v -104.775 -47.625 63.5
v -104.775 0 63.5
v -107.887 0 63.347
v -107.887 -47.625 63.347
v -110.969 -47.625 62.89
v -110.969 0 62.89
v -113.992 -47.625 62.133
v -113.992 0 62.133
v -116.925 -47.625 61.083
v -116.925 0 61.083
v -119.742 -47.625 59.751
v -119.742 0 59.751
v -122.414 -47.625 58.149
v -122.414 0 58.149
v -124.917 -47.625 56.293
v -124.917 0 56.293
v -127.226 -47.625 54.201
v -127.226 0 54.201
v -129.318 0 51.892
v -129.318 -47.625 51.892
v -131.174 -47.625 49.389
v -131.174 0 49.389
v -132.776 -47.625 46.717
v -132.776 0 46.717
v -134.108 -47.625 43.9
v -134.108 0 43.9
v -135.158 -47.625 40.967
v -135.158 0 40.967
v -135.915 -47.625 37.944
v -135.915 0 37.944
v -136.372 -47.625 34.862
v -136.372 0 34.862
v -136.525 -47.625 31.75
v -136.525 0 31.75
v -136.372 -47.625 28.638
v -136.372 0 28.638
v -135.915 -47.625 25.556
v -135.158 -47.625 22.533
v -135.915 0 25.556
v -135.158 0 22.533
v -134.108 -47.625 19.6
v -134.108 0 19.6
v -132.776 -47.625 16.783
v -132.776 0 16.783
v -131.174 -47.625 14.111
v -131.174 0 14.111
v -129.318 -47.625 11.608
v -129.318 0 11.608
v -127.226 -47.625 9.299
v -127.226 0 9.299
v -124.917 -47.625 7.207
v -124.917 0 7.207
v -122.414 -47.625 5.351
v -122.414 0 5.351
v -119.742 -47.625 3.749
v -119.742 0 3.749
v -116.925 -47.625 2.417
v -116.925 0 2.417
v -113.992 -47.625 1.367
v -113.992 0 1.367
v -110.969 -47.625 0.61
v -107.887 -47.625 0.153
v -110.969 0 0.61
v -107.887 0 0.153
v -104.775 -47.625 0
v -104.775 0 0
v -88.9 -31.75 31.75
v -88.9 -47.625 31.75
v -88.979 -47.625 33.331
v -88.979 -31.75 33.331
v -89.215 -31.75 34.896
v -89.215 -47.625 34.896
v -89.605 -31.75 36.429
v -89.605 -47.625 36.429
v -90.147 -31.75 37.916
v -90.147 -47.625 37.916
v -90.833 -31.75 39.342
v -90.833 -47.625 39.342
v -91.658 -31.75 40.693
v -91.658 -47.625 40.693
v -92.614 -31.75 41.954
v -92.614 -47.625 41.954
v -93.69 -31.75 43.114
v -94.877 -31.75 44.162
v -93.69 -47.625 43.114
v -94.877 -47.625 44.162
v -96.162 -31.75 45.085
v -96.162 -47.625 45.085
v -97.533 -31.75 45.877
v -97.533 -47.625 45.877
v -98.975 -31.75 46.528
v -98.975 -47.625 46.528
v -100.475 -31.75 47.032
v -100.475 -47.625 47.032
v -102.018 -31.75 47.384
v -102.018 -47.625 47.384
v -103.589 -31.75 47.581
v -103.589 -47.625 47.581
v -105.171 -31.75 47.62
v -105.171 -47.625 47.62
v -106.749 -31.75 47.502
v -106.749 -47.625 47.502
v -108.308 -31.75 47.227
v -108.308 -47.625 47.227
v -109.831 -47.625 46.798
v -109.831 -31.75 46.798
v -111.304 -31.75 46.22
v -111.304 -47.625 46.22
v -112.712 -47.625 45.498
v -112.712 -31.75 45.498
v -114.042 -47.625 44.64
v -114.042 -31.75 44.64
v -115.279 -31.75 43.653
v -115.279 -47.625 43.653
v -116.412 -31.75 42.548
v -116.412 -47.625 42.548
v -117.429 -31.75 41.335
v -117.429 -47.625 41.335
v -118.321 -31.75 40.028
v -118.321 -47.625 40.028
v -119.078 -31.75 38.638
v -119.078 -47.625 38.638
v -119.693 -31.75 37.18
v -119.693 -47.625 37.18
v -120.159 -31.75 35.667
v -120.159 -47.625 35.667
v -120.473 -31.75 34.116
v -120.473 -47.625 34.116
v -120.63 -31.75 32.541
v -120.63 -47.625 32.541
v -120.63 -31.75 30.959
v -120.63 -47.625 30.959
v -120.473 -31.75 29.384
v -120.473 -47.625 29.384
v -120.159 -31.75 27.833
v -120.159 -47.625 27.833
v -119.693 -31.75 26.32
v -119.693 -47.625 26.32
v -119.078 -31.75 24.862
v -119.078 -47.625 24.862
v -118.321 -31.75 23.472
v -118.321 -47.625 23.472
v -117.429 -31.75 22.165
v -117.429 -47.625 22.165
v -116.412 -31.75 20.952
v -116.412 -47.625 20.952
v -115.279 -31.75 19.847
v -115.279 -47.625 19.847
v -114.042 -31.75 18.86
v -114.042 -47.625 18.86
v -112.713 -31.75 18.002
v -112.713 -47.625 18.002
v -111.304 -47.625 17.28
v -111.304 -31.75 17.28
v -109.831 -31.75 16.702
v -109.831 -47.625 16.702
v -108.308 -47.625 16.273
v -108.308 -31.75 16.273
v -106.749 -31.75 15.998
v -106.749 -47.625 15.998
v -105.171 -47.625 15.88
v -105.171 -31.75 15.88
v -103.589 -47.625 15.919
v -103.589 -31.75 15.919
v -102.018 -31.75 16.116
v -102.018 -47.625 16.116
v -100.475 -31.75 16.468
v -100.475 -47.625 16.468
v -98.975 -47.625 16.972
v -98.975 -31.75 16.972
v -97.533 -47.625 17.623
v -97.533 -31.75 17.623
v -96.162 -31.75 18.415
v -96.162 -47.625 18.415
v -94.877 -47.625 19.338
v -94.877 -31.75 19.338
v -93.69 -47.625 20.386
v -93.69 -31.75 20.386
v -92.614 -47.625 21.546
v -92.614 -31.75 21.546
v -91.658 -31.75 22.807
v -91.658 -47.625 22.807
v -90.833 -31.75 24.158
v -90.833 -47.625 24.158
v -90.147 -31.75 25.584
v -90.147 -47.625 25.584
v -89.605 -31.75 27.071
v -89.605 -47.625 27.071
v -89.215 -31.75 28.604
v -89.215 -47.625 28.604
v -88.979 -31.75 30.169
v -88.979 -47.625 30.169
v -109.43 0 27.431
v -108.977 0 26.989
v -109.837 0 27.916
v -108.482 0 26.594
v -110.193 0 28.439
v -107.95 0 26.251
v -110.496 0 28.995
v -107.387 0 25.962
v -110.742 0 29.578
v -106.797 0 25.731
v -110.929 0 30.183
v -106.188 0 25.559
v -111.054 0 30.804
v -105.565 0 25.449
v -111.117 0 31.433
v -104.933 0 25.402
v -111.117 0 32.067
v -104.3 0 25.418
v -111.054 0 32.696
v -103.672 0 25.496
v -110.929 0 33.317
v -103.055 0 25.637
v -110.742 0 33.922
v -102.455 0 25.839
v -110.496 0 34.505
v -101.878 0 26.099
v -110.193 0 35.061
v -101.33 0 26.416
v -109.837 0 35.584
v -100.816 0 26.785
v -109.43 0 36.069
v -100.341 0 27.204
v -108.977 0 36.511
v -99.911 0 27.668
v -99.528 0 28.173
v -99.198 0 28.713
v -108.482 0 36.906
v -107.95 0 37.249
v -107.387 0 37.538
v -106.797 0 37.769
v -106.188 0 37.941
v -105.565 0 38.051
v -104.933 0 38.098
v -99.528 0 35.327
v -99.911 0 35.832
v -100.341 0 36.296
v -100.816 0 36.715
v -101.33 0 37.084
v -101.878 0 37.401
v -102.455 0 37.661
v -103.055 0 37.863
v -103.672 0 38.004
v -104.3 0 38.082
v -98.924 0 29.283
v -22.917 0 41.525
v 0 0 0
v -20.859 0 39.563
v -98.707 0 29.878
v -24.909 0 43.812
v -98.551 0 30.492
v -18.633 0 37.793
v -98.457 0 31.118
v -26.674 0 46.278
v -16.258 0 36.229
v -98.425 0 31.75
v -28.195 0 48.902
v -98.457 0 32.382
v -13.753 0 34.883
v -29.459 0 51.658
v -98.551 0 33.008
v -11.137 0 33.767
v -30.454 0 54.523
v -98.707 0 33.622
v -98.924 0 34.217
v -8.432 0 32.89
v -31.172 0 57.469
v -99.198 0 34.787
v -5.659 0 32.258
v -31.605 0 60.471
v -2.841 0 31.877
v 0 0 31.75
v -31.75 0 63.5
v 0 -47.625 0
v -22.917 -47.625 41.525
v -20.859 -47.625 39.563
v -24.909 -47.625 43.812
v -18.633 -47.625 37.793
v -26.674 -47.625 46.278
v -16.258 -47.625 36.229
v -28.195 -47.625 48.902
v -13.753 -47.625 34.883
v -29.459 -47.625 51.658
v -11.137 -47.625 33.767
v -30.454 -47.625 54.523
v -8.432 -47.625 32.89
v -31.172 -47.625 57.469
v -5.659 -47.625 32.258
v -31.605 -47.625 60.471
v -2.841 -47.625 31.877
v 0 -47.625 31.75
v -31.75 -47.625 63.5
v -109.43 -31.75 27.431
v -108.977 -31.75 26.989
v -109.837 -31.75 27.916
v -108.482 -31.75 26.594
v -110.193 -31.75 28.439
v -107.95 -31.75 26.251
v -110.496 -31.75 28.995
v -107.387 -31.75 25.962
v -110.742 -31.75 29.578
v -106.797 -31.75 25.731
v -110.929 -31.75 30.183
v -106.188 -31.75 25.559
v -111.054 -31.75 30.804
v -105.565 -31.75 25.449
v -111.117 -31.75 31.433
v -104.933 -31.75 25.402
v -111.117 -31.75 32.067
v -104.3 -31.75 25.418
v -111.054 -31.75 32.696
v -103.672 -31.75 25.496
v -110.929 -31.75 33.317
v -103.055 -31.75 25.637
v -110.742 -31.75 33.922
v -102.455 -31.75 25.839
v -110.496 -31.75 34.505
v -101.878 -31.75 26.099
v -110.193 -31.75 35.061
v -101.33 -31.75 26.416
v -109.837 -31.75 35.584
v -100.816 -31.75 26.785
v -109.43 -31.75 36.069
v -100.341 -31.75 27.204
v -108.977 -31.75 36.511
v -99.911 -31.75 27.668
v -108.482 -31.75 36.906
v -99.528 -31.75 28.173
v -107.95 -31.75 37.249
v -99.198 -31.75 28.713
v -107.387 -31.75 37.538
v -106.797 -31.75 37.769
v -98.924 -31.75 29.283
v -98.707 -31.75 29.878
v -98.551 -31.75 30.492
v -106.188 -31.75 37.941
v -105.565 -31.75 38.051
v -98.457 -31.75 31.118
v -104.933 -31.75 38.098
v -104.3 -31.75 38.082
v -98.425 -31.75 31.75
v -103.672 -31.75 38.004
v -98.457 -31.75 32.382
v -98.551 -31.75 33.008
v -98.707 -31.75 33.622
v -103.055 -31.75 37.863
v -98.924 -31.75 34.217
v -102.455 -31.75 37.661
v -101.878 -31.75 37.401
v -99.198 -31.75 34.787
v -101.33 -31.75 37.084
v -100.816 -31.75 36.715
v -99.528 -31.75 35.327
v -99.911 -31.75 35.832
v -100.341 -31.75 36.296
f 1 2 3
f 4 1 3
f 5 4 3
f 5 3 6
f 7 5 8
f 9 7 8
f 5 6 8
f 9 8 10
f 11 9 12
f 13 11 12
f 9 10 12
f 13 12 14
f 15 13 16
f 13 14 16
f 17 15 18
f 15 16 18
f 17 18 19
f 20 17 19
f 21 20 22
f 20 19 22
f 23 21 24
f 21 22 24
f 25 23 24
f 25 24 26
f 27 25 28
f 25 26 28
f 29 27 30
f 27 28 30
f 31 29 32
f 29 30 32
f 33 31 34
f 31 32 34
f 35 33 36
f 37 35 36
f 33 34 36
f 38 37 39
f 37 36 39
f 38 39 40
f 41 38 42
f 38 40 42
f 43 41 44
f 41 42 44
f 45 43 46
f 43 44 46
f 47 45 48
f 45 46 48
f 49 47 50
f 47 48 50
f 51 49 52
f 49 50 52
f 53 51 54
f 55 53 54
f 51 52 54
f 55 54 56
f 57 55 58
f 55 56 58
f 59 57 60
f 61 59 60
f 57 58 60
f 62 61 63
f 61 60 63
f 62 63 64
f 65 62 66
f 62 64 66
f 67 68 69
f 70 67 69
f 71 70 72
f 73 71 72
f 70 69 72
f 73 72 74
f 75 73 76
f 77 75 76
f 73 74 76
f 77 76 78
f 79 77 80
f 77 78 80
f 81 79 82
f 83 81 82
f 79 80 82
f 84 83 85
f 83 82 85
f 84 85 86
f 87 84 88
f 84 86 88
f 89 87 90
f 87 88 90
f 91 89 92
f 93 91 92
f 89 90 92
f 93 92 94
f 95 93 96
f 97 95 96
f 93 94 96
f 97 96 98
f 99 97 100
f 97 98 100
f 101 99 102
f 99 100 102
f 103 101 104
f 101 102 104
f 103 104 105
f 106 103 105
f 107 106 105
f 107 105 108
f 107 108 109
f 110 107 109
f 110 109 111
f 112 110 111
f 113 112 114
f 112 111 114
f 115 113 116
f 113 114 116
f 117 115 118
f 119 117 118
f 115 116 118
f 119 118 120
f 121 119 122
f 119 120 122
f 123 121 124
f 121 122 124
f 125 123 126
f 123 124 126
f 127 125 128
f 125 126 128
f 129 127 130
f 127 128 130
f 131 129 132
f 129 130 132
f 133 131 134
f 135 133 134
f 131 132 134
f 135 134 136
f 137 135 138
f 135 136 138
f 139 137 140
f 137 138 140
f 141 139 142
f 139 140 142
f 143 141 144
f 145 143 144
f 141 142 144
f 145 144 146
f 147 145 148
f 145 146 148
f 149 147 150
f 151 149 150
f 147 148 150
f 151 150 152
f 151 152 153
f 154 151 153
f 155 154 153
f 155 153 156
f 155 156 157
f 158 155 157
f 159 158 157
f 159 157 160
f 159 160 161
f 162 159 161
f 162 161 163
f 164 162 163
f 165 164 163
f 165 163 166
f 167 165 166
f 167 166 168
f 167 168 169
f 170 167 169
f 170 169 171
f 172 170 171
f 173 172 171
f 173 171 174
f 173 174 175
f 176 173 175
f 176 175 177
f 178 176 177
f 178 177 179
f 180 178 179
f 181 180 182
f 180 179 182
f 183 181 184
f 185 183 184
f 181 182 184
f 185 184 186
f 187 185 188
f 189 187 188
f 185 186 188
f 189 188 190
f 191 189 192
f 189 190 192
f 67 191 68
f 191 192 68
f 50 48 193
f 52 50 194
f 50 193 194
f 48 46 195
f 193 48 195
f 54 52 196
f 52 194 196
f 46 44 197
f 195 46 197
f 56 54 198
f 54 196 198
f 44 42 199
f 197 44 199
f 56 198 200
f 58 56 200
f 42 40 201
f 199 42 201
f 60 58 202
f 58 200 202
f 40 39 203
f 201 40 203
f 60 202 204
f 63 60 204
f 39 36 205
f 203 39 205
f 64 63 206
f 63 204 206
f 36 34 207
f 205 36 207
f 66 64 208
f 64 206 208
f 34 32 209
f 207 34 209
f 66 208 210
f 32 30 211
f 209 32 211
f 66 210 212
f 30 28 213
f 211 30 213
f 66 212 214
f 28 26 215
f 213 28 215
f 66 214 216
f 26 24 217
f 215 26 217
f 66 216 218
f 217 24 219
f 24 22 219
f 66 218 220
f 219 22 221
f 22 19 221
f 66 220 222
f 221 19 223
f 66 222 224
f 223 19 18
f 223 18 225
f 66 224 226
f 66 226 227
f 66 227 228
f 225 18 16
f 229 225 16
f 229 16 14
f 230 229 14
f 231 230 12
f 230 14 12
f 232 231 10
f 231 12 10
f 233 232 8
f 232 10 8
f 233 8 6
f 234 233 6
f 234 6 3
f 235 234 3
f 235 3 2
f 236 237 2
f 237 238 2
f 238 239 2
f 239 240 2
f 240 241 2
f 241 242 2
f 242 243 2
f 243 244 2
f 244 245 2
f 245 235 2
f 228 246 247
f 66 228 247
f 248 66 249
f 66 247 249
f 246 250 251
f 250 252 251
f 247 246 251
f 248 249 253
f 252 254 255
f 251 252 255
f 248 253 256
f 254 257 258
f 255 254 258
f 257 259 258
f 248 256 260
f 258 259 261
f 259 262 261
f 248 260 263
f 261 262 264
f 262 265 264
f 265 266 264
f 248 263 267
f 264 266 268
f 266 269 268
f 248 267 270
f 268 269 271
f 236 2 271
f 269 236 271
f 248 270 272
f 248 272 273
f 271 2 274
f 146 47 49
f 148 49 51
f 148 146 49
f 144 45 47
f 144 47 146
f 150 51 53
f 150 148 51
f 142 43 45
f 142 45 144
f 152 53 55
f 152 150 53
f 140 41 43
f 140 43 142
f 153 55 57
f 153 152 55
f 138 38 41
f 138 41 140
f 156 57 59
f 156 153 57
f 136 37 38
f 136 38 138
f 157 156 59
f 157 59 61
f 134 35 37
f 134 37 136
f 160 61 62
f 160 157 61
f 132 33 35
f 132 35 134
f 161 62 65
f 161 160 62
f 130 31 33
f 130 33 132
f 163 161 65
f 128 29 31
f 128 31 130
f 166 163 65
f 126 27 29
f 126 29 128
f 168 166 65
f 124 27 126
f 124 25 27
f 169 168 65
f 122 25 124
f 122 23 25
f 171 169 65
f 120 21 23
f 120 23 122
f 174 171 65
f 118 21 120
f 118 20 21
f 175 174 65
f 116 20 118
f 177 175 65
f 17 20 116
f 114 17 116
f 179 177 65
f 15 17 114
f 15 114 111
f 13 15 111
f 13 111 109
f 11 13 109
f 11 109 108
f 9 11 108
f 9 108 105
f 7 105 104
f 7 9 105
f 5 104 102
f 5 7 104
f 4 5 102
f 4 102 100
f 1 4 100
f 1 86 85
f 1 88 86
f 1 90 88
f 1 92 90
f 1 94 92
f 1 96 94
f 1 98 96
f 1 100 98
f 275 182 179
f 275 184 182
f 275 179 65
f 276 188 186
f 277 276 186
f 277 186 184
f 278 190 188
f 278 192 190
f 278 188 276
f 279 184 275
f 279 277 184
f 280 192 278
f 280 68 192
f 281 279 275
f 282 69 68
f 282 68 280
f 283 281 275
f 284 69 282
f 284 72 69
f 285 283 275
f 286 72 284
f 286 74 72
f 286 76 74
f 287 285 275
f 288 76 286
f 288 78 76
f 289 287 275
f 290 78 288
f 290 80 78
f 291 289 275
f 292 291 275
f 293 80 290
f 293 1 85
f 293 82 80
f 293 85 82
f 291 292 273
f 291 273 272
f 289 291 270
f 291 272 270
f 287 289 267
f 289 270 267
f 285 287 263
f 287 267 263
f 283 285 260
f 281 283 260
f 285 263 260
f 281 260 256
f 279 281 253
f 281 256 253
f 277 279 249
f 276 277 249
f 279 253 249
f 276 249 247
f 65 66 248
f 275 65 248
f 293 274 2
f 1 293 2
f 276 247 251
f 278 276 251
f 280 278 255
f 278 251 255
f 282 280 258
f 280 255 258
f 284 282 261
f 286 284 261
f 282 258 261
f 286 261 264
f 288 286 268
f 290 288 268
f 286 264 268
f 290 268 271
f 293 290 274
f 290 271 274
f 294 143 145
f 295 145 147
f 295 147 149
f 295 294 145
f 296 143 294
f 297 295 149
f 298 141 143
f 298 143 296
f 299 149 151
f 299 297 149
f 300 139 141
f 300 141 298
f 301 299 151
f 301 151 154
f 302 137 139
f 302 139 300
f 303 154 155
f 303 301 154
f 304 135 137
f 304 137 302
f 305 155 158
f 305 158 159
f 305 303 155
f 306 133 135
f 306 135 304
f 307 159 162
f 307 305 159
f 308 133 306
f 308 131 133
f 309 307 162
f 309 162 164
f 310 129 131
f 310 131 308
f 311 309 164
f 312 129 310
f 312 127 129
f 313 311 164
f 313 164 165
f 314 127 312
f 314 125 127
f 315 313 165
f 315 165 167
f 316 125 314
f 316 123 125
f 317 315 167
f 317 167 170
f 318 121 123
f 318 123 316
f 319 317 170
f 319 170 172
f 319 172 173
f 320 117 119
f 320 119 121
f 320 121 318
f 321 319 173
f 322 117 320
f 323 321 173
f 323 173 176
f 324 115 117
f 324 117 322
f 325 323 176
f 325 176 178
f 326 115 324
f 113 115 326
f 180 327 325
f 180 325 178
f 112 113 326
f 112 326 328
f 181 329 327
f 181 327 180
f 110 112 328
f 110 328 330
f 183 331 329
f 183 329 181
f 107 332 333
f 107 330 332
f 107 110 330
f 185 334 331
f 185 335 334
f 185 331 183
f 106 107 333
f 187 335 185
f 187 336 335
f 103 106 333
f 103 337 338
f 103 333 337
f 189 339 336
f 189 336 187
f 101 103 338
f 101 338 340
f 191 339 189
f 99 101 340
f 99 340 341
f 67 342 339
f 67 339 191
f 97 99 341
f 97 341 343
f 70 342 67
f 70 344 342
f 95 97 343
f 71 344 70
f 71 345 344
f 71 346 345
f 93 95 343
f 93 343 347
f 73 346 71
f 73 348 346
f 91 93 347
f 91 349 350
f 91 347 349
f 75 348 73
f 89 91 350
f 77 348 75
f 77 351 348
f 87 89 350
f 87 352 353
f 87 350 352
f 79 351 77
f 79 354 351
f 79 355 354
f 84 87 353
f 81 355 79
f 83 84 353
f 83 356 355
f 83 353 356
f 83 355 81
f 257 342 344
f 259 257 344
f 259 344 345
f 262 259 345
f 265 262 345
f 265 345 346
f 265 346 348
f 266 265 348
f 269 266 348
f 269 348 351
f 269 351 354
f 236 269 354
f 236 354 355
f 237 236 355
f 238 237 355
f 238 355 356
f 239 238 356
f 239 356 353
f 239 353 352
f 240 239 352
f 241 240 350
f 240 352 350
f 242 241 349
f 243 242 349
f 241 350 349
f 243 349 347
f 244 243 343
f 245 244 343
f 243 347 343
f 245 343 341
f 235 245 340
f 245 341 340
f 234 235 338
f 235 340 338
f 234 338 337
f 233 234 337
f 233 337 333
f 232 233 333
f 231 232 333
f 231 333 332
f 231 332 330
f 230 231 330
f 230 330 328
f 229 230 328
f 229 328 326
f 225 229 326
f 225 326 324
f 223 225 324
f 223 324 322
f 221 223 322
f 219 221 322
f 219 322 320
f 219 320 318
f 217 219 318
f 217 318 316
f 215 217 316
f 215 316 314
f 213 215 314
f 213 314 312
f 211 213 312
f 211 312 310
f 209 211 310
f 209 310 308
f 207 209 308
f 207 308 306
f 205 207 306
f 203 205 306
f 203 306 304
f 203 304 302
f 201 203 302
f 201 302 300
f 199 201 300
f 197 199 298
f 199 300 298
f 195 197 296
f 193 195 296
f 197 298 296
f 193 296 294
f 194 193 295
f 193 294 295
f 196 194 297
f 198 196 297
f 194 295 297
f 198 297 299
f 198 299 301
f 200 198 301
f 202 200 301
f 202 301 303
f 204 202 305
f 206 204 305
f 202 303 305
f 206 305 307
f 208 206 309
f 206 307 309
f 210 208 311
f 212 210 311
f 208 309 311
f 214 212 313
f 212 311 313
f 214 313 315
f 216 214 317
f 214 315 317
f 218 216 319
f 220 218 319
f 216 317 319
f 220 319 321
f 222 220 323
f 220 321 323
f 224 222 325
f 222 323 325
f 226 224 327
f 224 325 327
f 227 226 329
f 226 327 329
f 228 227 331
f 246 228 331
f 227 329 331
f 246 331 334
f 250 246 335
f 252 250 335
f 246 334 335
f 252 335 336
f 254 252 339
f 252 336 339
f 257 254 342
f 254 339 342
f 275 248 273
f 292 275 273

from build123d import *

# Parameters (mm, degrees)
F1_DEPTH = 47.625
F2_R     = 6.35
F3_DEPTH = 47.625
F4_R     = 15.875
F4_R_2   = 6.35
F5_DEPTH = 15.875


with BuildPart() as f1:
    # F0 (on Front) → F1 (new body)
    with BuildSketch(Plane.XZ):
        with BuildLine():
            ThreePointArc((-104.775, 63.5), (-136.525, 31.75), (-104.775, 0))
            Line((-104.775, 0), (-104.775, 63.5))
        make_face()
        with BuildLine():
            Line((-104.775, 0), (0, 0))
            Line((0, 0), (0, 31.75))
            ThreePointArc((0, 31.75), (-12.457359, 34.295947), (-22.916874, 41.525483))
            ThreePointArc((-22.916874, 41.525483), (-29.459067, 51.658299), (-31.75, 63.5))
            Line((-31.75, 63.5), (-104.775, 63.5))
            Line((-104.775, 63.5), (-104.775, 0))
        make_face()
    extrude(amount=F1_DEPTH)

    # F2 (on face) → F3 (cut)
    with BuildSketch(Plane.XZ.offset(47.625)):
        with Locations((-104.775, 31.75)):
            Circle(F2_R)
    extrude(amount=-F3_DEPTH, mode=Mode.SUBTRACT)

    # F4 (on face) → F5 (cut)
    with BuildSketch(Plane.XZ.offset(47.625)):
        with Locations((-104.775, 31.75)):
            Circle(F4_R)
        with Locations((-104.775, 31.75)):
            Circle(F4_R_2, mode=Mode.SUBTRACT)
    extrude(amount=-F5_DEPTH, mode=Mode.SUBTRACT)


solid = f1.part
